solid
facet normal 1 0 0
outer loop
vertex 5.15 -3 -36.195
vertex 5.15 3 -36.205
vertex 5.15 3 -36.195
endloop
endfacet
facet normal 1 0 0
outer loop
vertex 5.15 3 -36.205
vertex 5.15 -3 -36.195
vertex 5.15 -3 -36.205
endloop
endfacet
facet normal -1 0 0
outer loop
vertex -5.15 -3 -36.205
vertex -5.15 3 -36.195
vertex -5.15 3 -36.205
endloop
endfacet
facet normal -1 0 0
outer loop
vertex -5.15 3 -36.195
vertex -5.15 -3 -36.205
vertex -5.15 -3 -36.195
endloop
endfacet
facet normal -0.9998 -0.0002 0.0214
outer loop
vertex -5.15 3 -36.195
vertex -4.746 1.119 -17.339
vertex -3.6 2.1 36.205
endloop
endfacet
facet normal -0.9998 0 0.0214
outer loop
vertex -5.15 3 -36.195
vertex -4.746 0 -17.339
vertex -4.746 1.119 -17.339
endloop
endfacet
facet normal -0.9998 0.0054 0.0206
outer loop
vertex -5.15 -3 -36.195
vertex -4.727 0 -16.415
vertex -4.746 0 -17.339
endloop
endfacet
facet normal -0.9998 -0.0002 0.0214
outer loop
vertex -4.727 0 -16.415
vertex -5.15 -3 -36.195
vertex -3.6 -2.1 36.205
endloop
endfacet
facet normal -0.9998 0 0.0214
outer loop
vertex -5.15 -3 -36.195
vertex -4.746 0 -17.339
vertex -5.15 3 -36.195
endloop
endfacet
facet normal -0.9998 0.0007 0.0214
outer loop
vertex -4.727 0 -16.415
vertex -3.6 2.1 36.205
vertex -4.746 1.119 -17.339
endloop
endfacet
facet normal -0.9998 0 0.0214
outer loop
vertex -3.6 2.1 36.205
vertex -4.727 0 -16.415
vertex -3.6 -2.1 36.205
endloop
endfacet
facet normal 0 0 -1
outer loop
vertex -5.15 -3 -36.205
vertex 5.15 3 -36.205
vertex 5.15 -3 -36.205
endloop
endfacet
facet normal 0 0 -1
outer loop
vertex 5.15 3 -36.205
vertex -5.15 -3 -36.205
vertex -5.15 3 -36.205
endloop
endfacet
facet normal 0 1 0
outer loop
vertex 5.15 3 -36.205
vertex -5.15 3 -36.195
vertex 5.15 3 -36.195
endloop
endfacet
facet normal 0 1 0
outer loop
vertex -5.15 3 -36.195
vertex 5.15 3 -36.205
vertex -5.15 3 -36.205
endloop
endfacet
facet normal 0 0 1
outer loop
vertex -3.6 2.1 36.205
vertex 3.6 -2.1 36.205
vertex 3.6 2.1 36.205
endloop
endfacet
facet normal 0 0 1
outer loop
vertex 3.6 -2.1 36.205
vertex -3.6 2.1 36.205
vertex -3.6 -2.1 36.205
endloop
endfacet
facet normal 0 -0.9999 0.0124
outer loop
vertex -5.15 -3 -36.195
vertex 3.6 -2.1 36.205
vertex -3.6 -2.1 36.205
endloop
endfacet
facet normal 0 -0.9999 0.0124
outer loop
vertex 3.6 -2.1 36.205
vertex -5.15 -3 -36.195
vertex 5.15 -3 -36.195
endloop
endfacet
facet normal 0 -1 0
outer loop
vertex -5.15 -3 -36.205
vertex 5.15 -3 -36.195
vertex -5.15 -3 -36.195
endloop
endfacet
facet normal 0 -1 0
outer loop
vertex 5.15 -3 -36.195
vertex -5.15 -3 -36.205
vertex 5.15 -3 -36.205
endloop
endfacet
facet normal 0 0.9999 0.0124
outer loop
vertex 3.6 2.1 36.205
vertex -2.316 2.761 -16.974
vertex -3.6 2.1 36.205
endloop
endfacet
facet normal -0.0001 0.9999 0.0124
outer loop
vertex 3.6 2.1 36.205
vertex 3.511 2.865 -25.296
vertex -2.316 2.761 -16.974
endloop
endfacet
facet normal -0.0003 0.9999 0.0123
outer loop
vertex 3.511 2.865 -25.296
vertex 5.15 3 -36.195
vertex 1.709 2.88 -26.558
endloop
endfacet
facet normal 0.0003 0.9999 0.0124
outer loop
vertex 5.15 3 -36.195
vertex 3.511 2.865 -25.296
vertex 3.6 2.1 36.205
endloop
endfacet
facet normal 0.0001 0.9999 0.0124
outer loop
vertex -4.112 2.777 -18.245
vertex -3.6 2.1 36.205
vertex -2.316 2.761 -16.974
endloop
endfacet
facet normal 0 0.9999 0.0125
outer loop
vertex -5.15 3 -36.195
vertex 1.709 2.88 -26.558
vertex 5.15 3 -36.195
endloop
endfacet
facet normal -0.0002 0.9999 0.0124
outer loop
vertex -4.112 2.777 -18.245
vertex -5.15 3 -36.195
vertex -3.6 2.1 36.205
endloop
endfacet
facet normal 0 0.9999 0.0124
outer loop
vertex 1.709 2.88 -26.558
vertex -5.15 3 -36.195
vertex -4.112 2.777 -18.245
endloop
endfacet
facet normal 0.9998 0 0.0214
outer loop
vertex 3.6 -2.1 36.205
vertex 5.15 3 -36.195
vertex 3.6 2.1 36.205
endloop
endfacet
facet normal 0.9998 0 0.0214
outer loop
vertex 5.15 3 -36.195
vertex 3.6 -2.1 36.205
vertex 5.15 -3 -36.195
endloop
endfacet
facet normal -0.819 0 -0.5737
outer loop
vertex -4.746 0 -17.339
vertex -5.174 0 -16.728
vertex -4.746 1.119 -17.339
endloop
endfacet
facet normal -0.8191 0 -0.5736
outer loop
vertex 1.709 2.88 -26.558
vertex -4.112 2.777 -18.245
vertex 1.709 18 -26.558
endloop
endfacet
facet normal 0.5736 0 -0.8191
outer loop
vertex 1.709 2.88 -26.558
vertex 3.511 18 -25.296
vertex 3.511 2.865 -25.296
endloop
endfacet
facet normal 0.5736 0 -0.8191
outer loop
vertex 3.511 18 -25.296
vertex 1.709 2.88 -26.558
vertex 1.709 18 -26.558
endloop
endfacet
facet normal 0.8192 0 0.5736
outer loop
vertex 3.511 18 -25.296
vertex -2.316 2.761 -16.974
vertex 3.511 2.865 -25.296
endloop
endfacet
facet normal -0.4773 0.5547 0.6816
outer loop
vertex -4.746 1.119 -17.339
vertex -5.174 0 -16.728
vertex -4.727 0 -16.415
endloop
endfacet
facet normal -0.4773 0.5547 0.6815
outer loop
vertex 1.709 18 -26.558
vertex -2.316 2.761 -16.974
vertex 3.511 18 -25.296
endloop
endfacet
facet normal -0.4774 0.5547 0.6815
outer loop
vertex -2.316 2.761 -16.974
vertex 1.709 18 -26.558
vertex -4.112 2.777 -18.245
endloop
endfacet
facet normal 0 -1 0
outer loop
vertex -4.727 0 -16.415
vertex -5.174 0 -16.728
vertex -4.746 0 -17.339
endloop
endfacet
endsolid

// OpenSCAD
$fn=64;

L = 72.4;
Wmax = 10.3;
Wmin = 7.2;
Tmax = 6.0;
Tmin = 4.2;

fin_len = 18.0;
fin_height = 12.0;
fin_thick = 2.2;
fin_angle = 55;

module tapered_arm(len=L, w1=Wmax, w2=Wmin, t1=Tmax, t2=Tmin){
    hull(){
        translate([0,0,-len/2])
            cube([w1,t1,0.01], center=true);
        translate([0,0, len/2])
            cube([w2,t2,0.01], center=true);
    }
}

module triangular_fin(len=fin_len, height=fin_height, thick=fin_thick){
    linear_extrude(height=thick, center=true, convexity=10)
        polygon(points=[
            [0,0],
            [len,0],
            [0,height]
        ]);
}

module part(){
    union(){
        tapered_arm();

        translate([0,0,-L/2 + 14])
            rotate([0,fin_angle,0])
                translate([Wmax/2 - 0.6, 0, 0])
                    rotate([0,0,90])
                        triangular_fin();
    }
}

part();
